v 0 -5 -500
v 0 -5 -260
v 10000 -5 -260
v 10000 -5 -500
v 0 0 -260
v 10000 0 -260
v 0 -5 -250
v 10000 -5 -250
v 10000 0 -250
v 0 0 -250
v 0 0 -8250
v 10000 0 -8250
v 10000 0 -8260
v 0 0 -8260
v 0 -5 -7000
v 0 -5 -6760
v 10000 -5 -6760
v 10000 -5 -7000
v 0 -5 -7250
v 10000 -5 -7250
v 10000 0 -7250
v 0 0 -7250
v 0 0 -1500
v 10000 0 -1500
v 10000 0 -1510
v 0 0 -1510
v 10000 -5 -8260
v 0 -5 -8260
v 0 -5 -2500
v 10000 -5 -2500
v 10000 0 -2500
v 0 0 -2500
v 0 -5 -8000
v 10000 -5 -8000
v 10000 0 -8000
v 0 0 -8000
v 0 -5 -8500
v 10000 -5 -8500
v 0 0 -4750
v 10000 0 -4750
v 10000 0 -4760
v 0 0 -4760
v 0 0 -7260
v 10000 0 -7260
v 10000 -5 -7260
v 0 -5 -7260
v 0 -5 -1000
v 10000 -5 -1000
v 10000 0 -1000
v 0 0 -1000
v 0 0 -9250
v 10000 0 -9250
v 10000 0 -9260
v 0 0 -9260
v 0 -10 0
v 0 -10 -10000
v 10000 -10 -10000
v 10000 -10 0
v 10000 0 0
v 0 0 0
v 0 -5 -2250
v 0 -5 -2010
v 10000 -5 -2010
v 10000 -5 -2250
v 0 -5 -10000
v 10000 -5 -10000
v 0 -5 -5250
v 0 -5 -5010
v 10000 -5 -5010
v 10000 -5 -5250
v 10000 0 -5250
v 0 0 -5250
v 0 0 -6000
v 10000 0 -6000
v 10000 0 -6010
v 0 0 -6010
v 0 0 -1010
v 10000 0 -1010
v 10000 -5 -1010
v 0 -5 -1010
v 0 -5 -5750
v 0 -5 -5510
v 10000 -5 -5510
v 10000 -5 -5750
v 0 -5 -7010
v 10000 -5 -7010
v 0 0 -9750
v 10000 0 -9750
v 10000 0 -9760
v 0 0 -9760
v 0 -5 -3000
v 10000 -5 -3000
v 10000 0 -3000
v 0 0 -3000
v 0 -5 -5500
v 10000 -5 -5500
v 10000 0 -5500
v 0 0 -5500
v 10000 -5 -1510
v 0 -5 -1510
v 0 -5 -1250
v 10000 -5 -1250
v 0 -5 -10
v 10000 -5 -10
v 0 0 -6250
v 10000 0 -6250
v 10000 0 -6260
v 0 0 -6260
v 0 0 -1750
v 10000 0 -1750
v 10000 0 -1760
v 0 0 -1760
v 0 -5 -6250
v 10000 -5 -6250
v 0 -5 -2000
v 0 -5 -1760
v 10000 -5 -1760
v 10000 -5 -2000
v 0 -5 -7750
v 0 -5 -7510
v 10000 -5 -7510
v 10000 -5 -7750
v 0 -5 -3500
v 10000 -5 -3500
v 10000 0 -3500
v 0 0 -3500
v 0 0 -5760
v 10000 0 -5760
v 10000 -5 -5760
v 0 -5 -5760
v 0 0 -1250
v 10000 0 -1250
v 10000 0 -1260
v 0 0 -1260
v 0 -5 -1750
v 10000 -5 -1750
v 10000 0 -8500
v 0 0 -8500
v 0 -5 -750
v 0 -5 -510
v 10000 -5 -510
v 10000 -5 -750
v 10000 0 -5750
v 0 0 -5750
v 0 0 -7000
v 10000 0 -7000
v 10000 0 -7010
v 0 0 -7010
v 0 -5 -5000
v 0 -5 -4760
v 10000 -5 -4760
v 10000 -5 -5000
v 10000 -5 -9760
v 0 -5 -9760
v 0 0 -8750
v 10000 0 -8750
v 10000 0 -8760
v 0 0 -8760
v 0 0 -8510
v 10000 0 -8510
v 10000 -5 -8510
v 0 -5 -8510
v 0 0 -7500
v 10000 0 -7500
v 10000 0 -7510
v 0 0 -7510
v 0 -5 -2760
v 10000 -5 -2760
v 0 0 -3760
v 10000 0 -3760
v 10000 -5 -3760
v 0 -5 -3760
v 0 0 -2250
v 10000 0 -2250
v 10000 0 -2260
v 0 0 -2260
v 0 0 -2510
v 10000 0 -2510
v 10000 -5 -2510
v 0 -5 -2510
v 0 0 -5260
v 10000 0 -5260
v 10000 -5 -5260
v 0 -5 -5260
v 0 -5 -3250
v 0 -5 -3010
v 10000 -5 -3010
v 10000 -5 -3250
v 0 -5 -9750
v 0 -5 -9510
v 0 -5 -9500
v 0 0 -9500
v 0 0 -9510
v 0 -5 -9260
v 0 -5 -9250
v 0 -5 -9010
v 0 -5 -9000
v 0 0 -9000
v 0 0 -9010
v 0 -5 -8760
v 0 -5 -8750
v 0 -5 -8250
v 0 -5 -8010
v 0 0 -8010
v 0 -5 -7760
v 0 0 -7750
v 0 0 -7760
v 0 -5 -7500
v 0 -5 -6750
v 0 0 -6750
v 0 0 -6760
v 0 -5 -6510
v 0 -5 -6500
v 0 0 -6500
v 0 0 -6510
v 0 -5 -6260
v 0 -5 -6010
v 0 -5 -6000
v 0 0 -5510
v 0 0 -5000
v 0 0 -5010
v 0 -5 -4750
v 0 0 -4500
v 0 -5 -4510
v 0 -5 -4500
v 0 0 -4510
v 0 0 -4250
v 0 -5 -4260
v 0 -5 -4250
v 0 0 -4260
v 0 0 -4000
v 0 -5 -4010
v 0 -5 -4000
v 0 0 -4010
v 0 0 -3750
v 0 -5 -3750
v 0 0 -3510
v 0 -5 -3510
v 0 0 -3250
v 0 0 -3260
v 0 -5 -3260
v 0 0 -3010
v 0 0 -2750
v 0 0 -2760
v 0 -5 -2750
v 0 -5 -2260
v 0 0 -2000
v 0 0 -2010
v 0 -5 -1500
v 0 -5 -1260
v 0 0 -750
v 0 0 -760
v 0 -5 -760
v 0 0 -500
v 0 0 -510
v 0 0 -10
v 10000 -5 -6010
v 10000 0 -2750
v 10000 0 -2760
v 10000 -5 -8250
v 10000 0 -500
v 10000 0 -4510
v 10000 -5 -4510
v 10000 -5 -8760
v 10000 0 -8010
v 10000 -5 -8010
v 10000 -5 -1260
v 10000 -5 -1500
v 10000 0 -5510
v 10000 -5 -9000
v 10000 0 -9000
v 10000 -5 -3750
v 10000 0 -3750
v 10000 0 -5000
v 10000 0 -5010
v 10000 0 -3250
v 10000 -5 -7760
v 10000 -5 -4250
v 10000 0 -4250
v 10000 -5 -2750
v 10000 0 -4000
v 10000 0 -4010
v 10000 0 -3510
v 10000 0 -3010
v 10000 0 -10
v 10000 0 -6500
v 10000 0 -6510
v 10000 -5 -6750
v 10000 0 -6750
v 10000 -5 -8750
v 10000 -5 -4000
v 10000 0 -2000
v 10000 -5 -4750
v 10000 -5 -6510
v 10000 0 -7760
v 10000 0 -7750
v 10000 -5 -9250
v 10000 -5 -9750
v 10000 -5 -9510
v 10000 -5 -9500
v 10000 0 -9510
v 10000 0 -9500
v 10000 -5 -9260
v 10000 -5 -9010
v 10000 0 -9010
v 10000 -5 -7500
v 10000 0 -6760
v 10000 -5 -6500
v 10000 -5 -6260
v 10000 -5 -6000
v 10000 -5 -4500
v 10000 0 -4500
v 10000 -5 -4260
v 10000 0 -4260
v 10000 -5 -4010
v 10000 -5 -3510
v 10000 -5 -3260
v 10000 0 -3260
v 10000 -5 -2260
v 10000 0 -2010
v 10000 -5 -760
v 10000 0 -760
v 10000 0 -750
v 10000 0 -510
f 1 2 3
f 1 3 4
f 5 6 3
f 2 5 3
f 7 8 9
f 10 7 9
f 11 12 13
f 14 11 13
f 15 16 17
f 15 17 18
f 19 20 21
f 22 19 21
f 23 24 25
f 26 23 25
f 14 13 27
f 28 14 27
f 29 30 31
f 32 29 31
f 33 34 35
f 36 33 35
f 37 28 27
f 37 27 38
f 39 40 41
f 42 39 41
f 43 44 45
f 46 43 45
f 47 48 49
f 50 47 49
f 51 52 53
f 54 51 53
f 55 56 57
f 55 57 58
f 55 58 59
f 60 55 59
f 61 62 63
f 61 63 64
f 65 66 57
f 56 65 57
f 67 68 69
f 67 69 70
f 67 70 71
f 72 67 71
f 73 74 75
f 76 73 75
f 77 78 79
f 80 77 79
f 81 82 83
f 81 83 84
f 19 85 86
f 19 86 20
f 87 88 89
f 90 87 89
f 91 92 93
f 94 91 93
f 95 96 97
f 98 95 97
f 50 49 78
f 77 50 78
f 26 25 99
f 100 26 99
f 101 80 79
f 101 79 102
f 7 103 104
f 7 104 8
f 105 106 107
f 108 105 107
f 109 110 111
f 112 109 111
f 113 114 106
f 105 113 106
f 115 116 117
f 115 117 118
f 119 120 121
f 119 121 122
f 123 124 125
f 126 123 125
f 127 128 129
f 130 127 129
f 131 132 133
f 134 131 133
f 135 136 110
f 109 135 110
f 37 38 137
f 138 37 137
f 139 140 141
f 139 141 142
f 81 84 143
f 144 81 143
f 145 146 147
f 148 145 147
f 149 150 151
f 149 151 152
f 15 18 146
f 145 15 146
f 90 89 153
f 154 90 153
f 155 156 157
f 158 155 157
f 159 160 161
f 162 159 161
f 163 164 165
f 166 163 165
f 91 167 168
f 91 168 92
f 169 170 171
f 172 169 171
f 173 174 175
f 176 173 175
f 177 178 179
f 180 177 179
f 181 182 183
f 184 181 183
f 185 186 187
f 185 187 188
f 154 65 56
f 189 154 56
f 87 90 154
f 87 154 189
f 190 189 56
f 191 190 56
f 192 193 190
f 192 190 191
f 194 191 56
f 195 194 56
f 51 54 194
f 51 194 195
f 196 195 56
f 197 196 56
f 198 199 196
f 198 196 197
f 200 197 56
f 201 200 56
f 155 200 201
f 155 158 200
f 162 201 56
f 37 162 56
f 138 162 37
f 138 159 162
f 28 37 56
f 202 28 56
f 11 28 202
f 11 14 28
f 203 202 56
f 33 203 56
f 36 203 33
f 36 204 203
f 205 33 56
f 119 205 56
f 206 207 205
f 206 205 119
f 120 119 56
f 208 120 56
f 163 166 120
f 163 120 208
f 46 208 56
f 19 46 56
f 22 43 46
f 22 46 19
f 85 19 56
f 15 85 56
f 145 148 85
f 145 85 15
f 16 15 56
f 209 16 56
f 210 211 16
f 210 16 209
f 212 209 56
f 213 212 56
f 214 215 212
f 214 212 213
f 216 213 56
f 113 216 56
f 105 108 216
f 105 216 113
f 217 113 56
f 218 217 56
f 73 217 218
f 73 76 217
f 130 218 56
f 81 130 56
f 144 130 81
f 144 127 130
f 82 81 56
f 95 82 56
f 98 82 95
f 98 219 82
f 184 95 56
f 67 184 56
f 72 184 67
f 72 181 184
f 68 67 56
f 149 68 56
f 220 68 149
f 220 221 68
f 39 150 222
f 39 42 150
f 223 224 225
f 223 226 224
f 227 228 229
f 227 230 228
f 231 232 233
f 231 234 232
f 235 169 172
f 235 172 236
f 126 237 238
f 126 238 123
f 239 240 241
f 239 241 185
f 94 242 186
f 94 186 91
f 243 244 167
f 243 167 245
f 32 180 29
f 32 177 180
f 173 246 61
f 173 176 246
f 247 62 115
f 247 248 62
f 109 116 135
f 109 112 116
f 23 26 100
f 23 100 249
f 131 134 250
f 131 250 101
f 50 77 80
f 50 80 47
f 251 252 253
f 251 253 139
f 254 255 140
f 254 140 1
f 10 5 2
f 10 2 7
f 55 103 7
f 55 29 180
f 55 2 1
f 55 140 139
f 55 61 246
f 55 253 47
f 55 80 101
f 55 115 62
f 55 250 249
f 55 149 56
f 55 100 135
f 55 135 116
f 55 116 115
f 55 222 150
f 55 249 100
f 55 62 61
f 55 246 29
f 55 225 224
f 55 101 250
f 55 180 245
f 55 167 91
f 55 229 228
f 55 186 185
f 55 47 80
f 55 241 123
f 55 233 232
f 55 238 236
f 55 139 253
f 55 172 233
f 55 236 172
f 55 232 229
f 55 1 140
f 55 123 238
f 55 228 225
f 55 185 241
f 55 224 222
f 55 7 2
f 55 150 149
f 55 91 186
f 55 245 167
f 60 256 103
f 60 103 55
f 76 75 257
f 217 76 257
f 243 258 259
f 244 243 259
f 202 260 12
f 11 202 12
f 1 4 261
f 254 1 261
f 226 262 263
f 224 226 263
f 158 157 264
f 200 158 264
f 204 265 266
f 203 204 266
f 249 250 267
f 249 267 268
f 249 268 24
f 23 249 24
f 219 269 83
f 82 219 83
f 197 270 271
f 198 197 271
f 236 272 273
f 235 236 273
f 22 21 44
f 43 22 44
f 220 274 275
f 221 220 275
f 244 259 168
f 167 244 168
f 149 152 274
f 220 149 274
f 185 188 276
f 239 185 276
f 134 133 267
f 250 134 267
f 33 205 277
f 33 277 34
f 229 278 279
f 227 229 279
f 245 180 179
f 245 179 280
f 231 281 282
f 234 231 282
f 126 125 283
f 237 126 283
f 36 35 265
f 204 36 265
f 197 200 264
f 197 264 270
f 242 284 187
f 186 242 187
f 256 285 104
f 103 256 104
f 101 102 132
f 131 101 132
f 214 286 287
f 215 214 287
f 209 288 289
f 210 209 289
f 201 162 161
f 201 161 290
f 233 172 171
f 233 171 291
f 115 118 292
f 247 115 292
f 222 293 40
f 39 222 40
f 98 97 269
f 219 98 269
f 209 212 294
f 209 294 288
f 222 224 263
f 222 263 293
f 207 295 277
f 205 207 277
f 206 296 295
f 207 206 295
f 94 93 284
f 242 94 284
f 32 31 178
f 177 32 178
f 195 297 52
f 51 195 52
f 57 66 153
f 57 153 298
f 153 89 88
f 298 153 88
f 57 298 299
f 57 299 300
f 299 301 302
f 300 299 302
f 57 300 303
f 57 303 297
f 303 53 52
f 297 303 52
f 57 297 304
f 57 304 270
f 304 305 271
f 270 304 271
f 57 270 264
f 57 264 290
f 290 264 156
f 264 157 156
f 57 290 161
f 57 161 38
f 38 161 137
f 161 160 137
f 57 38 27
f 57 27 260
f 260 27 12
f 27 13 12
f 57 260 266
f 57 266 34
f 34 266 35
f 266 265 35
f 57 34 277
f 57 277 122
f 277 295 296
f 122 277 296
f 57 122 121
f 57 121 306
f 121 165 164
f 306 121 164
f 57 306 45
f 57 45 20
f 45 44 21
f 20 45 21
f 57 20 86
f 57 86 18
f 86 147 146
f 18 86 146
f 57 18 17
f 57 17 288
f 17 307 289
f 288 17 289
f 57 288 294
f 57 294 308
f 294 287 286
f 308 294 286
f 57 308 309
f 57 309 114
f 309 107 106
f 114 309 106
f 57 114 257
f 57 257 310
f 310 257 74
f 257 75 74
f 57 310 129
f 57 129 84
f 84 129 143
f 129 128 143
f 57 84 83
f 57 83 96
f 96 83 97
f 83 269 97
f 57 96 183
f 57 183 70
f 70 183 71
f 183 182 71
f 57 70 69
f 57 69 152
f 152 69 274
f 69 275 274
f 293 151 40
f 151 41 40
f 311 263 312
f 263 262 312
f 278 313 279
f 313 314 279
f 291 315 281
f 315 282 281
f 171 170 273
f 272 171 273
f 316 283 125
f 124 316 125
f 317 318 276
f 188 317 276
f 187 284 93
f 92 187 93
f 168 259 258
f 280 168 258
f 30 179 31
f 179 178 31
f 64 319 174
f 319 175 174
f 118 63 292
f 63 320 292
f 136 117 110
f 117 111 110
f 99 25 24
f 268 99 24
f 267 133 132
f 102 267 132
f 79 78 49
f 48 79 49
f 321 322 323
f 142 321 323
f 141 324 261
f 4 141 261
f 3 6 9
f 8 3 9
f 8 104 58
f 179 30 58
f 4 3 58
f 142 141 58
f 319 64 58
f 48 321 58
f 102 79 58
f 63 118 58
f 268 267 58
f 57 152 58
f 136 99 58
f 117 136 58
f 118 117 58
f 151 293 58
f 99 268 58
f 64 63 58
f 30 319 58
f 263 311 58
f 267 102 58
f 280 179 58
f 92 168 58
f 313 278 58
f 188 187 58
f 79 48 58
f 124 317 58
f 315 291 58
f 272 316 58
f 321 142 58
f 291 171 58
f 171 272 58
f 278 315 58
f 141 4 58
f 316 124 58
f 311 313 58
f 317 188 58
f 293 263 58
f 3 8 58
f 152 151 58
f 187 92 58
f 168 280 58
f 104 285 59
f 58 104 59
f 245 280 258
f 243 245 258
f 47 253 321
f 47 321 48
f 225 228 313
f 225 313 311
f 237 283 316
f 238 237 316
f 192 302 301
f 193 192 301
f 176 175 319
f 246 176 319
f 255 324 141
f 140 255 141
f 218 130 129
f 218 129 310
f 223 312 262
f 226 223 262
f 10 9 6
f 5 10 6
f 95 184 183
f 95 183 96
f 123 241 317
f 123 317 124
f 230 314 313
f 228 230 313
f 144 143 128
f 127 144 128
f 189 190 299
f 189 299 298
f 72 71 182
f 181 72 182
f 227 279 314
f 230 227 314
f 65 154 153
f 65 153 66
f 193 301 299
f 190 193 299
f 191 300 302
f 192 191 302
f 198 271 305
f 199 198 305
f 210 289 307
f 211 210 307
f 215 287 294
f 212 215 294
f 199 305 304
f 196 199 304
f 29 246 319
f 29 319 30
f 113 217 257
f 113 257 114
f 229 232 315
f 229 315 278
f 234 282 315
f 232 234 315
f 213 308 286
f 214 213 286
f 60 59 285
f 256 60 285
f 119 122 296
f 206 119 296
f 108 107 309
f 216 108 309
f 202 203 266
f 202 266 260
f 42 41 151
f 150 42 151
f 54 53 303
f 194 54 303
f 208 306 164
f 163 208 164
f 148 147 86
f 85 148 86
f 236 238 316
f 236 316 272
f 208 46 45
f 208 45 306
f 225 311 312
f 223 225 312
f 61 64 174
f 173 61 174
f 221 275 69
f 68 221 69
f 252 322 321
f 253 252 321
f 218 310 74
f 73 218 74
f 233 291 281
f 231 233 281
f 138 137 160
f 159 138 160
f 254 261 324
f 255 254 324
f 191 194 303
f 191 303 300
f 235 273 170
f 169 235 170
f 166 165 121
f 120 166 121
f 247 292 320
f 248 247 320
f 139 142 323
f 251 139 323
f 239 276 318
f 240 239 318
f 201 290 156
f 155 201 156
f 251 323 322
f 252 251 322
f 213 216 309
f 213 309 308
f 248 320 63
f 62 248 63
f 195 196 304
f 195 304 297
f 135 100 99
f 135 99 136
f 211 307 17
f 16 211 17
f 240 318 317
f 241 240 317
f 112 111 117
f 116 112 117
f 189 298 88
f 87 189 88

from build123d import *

# Parameters (mm, degrees)
EXTRUDE_1_DEPTH = 10000


with BuildPart() as part:
    # 草图1 → 凸台-拉伸1 (new body)
    with BuildSketch(Plane(origin=(0, 0, 0), x_dir=(0, 0, -1), z_dir=(1, 0, 0))):
        Polygon((0, 0), (10, 0), (10, -5), (250, -5), (250, 0), (260, 0), (260, -5), (500, -5), (500, 0), (510, 0), (510, -5), (750, -5), (750, 0), (760, 0), (760, -5), (1000, -5), (1000, 0), (1010, 0), (1010, -5), (1250, -5), (1250, 0), (1260, 0), (1260, -5), (1500, -5), (1500, 0), (1510, 0), (1510, -5), (1750, -5), (1750, 0), (1760, 0), (1760, -5), (2000, -5), (2000, 0), (2010, 0), (2010, -5), (2250, -5), (2250, 0), (2260, 0), (2260, -5), (2500, -5), (2500, 0), (2510, 0), (2510, -5), (2750, -5), (2750, 0), (2760, 0), (2760, -5), (3000, -5), (3000, 0), (3010, 0), (3010, -5), (3250, -5), (3250, 0), (3260, 0), (3260, -5), (3500, -5), (3500, 0), (3510, 0), (3510, -5), (3750, -5), (3750, 0), (3760, 0), (3760, -5), (4000, -5), (4000, 0), (4010, 0), (4010, -5), (4250, -5), (4250, 0), (4260, 0), (4260, -5), (4500, -5), (4500, 0), (4510, 0), (4510, -5), (4750, -5), (4750, 0), (4760, 0), (4760, -5), (5000, -5), (5000, 0), (5010, 0), (5010, -5), (5250, -5), (5250, 0), (5260, 0), (5260, -5), (5500, -5), (5500, 0), (5510, 0), (5510, -5), (5750, -5), (5750, 0), (5760, 0), (5760, -5), (6000, -5), (6000, 0), (6010, 0), (6010, -5), (6250, -5), (6250, 0), (6260, 0), (6260, -5), (6500, -5), (6500, 0), (6510, 0), (6510, -5), (6750, -5), (6750, 0), (6760, 0), (6760, -5), (7000, -5), (7000, 0), (7010, 0), (7010, -5), (7250, -5), (7250, 0), (7260, 0), (7260, -5), (7500, -5), (7500, 0), (7510, 0), (7510, -5), (7750, -5), (7750, 0), (7760, 0), (7760, -5), (8000, -5), (8000, 0), (8010, 0), (8010, -5), (8250, -5), (8250, 0), (8260, 0), (8260, -5), (8500, -5), (8500, 0), (8510, 0), (8510, -5), (8750, -5), (8750, 0), (8760, 0), (8760, -5), (9000, -5), (9000, 0), (9010, 0), (9010, -5), (9250, -5), (9250, 0), (9260, 0), (9260, -5), (9500, -5), (9500, 0), (9510, 0), (9510, -5), (9750, -5), (9750, 0), (9760, 0), (9760, -5), (10000, -5), (10000, -10), (0, -10), align=None)
    extrude(amount=EXTRUDE_1_DEPTH)


solid = part.part
